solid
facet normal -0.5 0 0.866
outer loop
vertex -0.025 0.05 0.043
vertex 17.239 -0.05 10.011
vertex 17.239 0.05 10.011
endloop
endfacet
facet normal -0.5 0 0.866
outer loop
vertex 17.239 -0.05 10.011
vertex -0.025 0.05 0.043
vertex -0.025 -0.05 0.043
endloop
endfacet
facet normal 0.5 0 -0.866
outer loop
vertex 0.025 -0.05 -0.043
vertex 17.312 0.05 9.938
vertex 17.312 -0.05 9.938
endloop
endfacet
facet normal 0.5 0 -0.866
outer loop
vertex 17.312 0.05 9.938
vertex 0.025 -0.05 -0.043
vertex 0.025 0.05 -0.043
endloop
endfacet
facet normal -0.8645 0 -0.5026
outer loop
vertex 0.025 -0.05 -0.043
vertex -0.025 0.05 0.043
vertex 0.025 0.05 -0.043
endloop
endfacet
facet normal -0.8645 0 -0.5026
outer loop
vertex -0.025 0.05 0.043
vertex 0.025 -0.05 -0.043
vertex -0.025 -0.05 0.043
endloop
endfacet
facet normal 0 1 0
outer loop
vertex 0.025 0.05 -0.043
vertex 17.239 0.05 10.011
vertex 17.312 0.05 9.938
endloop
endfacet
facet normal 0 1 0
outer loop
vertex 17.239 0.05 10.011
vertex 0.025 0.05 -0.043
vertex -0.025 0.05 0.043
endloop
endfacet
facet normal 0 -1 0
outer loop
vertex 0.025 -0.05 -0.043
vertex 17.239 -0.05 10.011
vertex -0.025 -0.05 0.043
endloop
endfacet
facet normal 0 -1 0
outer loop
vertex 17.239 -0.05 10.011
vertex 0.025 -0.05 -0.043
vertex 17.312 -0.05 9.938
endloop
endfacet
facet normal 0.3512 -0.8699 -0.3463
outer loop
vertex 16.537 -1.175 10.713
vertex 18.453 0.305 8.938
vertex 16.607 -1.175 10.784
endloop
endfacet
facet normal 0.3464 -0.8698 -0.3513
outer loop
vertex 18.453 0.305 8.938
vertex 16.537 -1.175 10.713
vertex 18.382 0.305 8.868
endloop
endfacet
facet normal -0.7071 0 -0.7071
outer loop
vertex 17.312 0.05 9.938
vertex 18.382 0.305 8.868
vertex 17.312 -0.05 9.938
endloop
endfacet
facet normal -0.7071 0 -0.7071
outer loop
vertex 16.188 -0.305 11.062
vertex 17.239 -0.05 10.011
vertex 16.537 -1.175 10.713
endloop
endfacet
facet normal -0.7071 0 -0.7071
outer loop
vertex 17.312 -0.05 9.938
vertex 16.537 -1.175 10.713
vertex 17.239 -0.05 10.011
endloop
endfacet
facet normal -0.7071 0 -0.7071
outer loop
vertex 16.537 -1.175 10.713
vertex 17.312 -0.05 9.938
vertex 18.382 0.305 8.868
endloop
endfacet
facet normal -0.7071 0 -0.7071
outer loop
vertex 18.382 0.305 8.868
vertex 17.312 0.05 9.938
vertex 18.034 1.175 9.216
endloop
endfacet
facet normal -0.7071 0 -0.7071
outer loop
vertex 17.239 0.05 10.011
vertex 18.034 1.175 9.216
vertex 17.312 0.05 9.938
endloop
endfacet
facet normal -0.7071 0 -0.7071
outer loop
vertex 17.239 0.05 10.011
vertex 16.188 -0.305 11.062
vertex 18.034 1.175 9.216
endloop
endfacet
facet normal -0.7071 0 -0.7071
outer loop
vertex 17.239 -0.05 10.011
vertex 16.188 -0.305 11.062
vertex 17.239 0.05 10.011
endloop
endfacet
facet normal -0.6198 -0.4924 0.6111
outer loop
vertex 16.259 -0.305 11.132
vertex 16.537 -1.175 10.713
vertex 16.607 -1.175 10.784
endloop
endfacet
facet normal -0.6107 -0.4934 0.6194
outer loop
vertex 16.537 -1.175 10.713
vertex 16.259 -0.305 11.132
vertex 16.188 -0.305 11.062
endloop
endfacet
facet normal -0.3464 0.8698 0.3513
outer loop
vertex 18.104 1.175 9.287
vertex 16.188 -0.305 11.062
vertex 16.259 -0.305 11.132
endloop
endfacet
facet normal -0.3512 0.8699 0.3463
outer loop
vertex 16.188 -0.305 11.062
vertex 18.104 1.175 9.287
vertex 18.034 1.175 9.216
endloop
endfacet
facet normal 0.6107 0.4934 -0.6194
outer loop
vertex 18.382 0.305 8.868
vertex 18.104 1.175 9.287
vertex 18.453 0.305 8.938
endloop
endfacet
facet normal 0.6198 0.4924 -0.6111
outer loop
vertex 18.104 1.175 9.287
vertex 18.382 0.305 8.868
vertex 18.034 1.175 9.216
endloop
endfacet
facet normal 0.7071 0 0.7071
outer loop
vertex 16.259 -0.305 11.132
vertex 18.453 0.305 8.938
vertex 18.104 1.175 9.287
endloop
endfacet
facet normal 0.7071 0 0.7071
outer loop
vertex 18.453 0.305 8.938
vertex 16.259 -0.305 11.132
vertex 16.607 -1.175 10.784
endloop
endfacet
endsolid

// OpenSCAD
lineLength=20;
bearing =0 + sin($t*360)*45;
elevation = 30+sin(-$t*360*2)*15;
yaw = bearing-sin($t*360)*30;
drift=5;
roll = sin(360*$t+90+drift)*120;
angleOfAttack=15;
pitch=elevation + angleOfAttack;
useNED=-1;
rotate(a=bearing, v=[0,0,1*useNED]) rotate(a=elevation, v=[0,1*useNED,0]){
	translate(v=[lineLength/2,0,0]) cube(size=[lineLength,0.1,0.1], center=true);
	translate(v=[lineLength,0,0]) 
 	  rotate(a=-1*elevation, v=[0,1*useNED,0]) rotate(a=-1*bearing, v=[0,0,1*useNED])
	  rotate(a=yaw ,v=[0,0,1*useNED]) rotate(a=pitch, v=[0,1*useNED,0]) rotate(a=roll, v=[1,0,0]) 
       color("red") cube(size=[0.1,,3,1],center=true); }
